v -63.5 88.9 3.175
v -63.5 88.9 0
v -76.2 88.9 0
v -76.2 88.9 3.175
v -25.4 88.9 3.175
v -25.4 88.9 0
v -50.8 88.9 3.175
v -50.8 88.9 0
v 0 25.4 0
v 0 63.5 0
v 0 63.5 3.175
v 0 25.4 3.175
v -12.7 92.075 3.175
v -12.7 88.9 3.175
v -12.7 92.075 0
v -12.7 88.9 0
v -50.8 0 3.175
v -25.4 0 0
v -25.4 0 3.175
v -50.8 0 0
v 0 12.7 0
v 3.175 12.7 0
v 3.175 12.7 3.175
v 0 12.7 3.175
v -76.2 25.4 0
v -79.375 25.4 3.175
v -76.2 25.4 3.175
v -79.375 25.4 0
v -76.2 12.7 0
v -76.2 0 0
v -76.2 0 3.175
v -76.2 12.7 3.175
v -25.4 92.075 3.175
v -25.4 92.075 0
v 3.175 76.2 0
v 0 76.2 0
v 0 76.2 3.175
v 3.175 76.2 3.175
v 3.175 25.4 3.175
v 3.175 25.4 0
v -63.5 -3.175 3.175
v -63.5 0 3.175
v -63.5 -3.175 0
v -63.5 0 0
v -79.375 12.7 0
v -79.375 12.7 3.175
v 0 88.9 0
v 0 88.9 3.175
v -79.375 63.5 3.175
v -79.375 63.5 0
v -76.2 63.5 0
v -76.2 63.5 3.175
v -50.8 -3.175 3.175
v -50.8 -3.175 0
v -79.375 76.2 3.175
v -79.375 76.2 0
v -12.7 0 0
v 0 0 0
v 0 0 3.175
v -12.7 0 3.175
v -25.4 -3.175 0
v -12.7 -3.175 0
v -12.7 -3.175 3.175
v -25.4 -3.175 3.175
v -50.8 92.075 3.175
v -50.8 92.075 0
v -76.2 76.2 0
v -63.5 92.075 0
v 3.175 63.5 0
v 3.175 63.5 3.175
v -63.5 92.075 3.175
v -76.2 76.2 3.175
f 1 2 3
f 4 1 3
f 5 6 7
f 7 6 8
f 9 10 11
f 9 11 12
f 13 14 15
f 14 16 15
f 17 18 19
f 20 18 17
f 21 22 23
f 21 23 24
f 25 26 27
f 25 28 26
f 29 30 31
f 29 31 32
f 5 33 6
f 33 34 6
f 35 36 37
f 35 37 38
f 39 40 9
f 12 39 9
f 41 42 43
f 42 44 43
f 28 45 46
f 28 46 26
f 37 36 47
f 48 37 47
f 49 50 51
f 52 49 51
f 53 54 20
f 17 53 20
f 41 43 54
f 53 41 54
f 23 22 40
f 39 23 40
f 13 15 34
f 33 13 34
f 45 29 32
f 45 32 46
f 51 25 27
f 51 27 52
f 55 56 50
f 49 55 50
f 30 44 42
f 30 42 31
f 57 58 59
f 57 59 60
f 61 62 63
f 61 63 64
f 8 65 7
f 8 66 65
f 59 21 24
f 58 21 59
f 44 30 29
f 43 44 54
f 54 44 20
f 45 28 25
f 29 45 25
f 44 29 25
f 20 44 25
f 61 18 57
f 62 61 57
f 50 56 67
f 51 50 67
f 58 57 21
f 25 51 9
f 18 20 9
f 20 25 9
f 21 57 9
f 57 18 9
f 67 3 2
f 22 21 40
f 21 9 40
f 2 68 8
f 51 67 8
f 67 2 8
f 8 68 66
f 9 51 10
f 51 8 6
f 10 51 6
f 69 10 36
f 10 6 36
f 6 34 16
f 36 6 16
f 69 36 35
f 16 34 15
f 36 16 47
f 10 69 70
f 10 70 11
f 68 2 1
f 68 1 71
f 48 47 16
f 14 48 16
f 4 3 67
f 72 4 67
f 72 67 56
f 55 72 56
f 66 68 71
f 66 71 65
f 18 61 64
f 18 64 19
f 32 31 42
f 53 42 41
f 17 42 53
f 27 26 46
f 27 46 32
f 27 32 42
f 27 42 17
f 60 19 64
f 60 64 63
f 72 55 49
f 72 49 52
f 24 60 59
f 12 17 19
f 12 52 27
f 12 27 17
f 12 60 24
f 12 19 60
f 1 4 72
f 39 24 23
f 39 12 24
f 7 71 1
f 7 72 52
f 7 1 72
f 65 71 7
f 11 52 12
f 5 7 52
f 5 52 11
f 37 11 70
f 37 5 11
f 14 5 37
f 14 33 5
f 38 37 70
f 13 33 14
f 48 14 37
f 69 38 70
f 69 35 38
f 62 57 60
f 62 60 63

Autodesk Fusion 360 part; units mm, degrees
sketch "Sketch1" plane through (0, 0, 0) normal (0, 0, 1) x (1, 0, 0)
  line L0 (0, 0) -> (-76.2, 0)
  line L1 (-76.2, 0) -> (-76.2, 76.2)
  line L2 (0, 76.2) -> (0, 0)
  line L3 (0, 76.2) -> (0, 88.9)
  line L4 (0, 88.9) -> (-76.2, 88.9)
  line L5 (-76.2, 88.9) -> (-76.2, 76.2)
  line L6 (-76.2, 0) -> (-63.5, 0)
  line L7 (-63.5, 0) -> (-63.5, -3.175)
  line L8 (-63.5, -3.175) -> (-50.8, -3.175)
  line L9 (-50.8, -3.175) -> (-50.8, 0)
  line L10 (-50.8, 0) -> (-38.1, 0)
  line L11 (0, 0) -> (-12.7, 0)
  line L12 (-12.7, 0) -> (-12.7, -3.175)
  line L13 (-12.7, -3.175) -> (-25.4, -3.175)
  line L14 (-25.4, -3.175) -> (-25.4, 0)
  line L15 (-76.2, 88.9) -> (-63.5, 88.9)
  line L16 (-63.5, 88.9) -> (-63.5, 92.075)
  line L17 (-63.5, 92.075) -> (-50.8, 92.075)
  line L18 (-50.8, 92.075) -> (-50.8, 88.9)
  line L19 (0, 88.9) -> (-12.7, 88.9)
  line L20 (-12.7, 88.9) -> (-12.7, 92.075)
  line L21 (-12.7, 92.075) -> (-25.4, 92.075)
  line L22 (-25.4, 92.075) -> (-25.4, 88.9)
  line L23 (-76.2, 0) -> (-76.2, 12.7)
  line L24 (-76.2, 12.7) -> (-79.375, 12.7)
  line L25 (-79.375, 12.7) -> (-79.375, 25.4)
  line L26 (-79.375, 25.4) -> (-76.2, 25.4)
  line L27 (-76.2, 88.9) -> (-76.2, 76.2)
  line L28 (-76.2, 76.2) -> (-79.375, 76.2)
  line L29 (-79.375, 76.2) -> (-79.375, 63.5)
  line L30 (-79.375, 63.5) -> (-76.2, 63.5)
  line L31 (3.175, 12.7) -> (3.175, 25.4)
  line L32 (3.175, 12.7) -> (0, 12.7)
  line L33 (3.175, 25.4) -> (0, 25.4)
  line L34 (0, 88.9) -> (0, 76.2)
  line L35 (0, 76.2) -> (3.175, 76.2)
  line L36 (3.175, 76.2) -> (3.175, 63.5)
  line L37 (3.175, 63.5) -> (0, 63.5)
  dimension "d1" = 76.2
  dimension "d2" = 76.2
  dimension "d3" = 12.7
  dimension "d4" = 3.175
  dimension "d5" = 12.7
  dimension "d6" = 12.7
  dimension "d7" = 12.7
  dimension "d8" = 3.175
  dimension "d9" = 12.7
  dimension "d10" = 12.7
  dimension "d11" = 3.175
  dimension "d12" = 12.7
  dimension "d13" = 12.7
  dimension "d14" = 3.175
  dimension "d15" = 12.7
  dimension "d16" = 12.7
  dimension "d17" = 3.175
  dimension "d18" = 12.7
  dimension "d19" = 12.7
  dimension "d20" = 3.175
  dimension "d21" = 12.7
  dimension "d24" = 12.7
  dimension "d25" = 12.7
  dimension "d26" = 3.175
  dimension "d27" = 12.7
extrude "Extrude1" add sketch "Sketch1" along normal blind 3.175
